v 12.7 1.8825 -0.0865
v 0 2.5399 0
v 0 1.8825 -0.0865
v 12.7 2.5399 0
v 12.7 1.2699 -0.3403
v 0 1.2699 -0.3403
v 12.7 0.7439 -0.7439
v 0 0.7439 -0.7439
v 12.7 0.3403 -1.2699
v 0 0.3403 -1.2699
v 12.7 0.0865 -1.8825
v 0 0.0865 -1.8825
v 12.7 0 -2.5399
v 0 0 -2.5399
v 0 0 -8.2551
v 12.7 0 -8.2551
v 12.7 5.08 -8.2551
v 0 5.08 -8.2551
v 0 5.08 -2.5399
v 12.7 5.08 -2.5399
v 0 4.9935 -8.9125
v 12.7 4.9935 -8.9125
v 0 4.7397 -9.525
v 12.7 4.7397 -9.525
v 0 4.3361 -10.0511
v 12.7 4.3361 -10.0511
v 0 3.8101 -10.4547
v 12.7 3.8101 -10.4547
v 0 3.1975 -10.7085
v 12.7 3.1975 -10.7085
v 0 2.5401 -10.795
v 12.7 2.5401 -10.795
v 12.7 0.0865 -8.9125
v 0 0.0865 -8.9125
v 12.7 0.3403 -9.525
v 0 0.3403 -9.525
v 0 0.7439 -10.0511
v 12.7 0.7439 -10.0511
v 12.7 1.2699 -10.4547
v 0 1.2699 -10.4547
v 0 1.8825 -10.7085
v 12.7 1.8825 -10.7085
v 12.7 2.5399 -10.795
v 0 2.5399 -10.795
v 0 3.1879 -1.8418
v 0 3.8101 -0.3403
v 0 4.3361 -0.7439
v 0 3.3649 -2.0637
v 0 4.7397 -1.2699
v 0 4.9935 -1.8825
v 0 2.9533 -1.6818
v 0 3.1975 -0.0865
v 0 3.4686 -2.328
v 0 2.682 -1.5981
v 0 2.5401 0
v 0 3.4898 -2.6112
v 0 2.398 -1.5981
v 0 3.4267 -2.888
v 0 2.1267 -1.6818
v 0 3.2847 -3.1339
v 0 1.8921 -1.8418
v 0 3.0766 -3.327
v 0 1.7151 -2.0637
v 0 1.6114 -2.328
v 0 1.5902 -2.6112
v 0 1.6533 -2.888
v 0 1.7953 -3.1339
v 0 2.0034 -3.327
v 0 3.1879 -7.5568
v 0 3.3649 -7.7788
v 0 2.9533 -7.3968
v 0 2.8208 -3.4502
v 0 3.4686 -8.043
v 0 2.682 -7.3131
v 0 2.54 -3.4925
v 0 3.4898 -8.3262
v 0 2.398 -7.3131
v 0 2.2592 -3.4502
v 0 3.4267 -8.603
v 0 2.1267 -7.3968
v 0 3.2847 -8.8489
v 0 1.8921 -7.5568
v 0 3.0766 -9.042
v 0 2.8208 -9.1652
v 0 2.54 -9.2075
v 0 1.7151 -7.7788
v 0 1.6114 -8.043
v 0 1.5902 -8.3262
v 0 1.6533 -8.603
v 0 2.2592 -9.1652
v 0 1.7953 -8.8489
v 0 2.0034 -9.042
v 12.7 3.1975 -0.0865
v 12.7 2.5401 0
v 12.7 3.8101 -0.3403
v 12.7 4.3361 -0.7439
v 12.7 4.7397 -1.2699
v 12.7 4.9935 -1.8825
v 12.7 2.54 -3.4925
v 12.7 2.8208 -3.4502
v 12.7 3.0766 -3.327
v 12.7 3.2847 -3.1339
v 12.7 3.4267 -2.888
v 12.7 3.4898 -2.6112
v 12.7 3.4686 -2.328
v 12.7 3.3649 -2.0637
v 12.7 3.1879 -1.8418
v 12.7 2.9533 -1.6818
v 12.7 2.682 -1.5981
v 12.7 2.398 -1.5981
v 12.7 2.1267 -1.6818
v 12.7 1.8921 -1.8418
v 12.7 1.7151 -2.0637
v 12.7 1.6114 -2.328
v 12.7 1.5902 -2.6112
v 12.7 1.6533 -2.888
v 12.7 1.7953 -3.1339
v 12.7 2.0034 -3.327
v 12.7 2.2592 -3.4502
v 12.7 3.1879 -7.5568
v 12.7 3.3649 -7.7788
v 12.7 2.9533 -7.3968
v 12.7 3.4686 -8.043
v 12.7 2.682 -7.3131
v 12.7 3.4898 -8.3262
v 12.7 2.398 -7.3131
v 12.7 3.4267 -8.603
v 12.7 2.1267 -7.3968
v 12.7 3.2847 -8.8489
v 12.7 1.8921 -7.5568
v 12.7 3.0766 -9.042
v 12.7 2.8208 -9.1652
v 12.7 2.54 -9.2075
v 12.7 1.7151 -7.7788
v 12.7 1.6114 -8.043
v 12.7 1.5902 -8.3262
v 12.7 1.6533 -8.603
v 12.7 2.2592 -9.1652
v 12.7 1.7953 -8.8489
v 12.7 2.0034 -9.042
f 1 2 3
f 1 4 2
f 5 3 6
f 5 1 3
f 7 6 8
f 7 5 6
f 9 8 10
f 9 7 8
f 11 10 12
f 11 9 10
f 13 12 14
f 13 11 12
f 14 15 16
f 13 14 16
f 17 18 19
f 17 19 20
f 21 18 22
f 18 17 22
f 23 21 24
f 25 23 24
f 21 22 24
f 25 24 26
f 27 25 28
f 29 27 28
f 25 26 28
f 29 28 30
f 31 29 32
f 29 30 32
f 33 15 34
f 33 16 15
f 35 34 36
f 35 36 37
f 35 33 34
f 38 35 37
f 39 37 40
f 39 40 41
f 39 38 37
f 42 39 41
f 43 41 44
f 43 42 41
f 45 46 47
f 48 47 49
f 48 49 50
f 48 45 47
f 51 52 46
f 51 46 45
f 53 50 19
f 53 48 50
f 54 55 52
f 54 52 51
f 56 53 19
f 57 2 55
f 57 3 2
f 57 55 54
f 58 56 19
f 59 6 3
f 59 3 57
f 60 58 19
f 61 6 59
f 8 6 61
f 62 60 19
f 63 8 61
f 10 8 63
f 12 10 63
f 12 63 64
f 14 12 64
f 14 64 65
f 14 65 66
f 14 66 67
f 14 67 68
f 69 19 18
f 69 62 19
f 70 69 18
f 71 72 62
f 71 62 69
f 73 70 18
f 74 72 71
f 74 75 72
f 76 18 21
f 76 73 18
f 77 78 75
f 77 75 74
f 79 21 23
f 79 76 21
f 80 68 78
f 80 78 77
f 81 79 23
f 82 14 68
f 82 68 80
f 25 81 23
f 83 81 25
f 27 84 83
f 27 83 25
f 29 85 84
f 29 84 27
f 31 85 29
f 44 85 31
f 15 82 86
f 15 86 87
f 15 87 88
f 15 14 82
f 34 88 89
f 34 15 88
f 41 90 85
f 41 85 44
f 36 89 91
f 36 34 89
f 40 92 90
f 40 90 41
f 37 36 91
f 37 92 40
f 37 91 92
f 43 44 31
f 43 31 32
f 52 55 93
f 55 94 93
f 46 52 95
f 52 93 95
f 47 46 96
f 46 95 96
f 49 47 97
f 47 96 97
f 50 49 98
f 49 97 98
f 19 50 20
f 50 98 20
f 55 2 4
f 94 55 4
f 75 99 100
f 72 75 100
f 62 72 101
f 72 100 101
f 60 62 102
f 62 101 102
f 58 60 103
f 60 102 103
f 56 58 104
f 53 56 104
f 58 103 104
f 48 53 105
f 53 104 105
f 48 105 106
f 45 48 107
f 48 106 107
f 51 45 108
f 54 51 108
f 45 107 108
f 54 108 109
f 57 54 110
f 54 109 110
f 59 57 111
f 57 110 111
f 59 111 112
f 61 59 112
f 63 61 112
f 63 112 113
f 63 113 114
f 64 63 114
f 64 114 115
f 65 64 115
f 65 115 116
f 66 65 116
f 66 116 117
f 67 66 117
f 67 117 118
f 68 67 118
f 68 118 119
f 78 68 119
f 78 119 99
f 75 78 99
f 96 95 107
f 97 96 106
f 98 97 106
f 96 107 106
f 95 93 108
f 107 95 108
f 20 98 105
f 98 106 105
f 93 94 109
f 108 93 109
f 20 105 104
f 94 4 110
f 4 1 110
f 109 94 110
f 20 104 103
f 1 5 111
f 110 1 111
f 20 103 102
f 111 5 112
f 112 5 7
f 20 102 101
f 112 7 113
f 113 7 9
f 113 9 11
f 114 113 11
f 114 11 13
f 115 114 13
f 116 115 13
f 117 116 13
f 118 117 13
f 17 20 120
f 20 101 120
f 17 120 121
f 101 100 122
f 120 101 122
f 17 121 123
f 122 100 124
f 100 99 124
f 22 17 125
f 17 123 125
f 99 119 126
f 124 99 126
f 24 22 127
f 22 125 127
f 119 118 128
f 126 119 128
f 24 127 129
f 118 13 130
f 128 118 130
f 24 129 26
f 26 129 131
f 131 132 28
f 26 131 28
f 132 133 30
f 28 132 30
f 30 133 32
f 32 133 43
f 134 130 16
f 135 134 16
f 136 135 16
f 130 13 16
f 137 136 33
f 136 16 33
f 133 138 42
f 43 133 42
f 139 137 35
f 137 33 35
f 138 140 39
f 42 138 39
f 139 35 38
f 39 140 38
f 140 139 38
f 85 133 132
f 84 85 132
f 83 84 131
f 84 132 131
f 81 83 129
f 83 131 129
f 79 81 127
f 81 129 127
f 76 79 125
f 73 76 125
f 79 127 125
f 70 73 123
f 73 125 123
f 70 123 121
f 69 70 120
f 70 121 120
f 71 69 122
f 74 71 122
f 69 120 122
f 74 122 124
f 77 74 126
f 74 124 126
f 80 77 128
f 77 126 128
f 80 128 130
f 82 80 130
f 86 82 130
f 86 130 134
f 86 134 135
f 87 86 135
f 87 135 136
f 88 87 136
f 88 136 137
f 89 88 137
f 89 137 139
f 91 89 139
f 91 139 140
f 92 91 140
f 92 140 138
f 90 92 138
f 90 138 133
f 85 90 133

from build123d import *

# Parameters (mm, degrees)
SKETCH1_W           = 12.7
SKETCH1_H           = 10.795
BOSS_EXTRUDE1_DEPTH = 5.08
CUT_EXTRUDE1_REACH  = 19.425
SKETCH2_R           = 0.9525
FILLET1_R           = 2.54


with BuildPart() as part:
    # Sketch1 → Boss-Extrude1 (new body)
    with BuildSketch(Plane(origin=(0, 0, 0), x_dir=(1, 0, 0), z_dir=(0, 1, 0))):
        with Locations((6.35, 5.3975)):
            Rectangle(SKETCH1_W, SKETCH1_H)
    extrude(amount=BOSS_EXTRUDE1_DEPTH)

    # Sketch2 → Cut-Extrude1 (cut, up to next)
    with BuildSketch(Plane(origin=(12.7, 0, 0), x_dir=(0, 0, -1), z_dir=(1, 0, 0)), mode=Mode.PRIVATE) as cut_extrude1_sk1:
        with Locations((2.54, 2.54)):
            Circle(SKETCH2_R)
    cut_extrude1_tool1 = extrude(cut_extrude1_sk1.sketch, amount=-CUT_EXTRUDE1_REACH, mode=Mode.PRIVATE) & part.part
    # Sketch2 → Cut-Extrude1 (cut, up to next)
    with BuildSketch(Plane(origin=(12.7, 0, 0), x_dir=(0, 0, -1), z_dir=(1, 0, 0)), mode=Mode.PRIVATE) as cut_extrude1_sk2:
        with Locations((8.255, 2.54)):
            Circle(SKETCH2_R)
    cut_extrude1_tool2 = extrude(cut_extrude1_sk2.sketch, amount=-CUT_EXTRUDE1_REACH, mode=Mode.PRIVATE) & part.part
    add(cut_extrude1_tool1.solids().sort_by_distance((12.7, 2.54, -2.54))[0], mode=Mode.SUBTRACT)
    add(cut_extrude1_tool2.solids().sort_by_distance((12.7, 2.54, -8.255))[0], mode=Mode.SUBTRACT)

    # Fillet1
    fillet1_edges = [part.edges().sort_by_distance(p)[0] for p in [
        (6.35, 0, -10.795),
        (6.35, 5.08, -10.795),
        (6.35, 0, 0),
        (6.35, 5.08, 0),
    ]]
    fillet(fillet1_edges, radius=FILLET1_R - 0.0001)  # a hair under: the kernel refuses the full size


solid = part.part
